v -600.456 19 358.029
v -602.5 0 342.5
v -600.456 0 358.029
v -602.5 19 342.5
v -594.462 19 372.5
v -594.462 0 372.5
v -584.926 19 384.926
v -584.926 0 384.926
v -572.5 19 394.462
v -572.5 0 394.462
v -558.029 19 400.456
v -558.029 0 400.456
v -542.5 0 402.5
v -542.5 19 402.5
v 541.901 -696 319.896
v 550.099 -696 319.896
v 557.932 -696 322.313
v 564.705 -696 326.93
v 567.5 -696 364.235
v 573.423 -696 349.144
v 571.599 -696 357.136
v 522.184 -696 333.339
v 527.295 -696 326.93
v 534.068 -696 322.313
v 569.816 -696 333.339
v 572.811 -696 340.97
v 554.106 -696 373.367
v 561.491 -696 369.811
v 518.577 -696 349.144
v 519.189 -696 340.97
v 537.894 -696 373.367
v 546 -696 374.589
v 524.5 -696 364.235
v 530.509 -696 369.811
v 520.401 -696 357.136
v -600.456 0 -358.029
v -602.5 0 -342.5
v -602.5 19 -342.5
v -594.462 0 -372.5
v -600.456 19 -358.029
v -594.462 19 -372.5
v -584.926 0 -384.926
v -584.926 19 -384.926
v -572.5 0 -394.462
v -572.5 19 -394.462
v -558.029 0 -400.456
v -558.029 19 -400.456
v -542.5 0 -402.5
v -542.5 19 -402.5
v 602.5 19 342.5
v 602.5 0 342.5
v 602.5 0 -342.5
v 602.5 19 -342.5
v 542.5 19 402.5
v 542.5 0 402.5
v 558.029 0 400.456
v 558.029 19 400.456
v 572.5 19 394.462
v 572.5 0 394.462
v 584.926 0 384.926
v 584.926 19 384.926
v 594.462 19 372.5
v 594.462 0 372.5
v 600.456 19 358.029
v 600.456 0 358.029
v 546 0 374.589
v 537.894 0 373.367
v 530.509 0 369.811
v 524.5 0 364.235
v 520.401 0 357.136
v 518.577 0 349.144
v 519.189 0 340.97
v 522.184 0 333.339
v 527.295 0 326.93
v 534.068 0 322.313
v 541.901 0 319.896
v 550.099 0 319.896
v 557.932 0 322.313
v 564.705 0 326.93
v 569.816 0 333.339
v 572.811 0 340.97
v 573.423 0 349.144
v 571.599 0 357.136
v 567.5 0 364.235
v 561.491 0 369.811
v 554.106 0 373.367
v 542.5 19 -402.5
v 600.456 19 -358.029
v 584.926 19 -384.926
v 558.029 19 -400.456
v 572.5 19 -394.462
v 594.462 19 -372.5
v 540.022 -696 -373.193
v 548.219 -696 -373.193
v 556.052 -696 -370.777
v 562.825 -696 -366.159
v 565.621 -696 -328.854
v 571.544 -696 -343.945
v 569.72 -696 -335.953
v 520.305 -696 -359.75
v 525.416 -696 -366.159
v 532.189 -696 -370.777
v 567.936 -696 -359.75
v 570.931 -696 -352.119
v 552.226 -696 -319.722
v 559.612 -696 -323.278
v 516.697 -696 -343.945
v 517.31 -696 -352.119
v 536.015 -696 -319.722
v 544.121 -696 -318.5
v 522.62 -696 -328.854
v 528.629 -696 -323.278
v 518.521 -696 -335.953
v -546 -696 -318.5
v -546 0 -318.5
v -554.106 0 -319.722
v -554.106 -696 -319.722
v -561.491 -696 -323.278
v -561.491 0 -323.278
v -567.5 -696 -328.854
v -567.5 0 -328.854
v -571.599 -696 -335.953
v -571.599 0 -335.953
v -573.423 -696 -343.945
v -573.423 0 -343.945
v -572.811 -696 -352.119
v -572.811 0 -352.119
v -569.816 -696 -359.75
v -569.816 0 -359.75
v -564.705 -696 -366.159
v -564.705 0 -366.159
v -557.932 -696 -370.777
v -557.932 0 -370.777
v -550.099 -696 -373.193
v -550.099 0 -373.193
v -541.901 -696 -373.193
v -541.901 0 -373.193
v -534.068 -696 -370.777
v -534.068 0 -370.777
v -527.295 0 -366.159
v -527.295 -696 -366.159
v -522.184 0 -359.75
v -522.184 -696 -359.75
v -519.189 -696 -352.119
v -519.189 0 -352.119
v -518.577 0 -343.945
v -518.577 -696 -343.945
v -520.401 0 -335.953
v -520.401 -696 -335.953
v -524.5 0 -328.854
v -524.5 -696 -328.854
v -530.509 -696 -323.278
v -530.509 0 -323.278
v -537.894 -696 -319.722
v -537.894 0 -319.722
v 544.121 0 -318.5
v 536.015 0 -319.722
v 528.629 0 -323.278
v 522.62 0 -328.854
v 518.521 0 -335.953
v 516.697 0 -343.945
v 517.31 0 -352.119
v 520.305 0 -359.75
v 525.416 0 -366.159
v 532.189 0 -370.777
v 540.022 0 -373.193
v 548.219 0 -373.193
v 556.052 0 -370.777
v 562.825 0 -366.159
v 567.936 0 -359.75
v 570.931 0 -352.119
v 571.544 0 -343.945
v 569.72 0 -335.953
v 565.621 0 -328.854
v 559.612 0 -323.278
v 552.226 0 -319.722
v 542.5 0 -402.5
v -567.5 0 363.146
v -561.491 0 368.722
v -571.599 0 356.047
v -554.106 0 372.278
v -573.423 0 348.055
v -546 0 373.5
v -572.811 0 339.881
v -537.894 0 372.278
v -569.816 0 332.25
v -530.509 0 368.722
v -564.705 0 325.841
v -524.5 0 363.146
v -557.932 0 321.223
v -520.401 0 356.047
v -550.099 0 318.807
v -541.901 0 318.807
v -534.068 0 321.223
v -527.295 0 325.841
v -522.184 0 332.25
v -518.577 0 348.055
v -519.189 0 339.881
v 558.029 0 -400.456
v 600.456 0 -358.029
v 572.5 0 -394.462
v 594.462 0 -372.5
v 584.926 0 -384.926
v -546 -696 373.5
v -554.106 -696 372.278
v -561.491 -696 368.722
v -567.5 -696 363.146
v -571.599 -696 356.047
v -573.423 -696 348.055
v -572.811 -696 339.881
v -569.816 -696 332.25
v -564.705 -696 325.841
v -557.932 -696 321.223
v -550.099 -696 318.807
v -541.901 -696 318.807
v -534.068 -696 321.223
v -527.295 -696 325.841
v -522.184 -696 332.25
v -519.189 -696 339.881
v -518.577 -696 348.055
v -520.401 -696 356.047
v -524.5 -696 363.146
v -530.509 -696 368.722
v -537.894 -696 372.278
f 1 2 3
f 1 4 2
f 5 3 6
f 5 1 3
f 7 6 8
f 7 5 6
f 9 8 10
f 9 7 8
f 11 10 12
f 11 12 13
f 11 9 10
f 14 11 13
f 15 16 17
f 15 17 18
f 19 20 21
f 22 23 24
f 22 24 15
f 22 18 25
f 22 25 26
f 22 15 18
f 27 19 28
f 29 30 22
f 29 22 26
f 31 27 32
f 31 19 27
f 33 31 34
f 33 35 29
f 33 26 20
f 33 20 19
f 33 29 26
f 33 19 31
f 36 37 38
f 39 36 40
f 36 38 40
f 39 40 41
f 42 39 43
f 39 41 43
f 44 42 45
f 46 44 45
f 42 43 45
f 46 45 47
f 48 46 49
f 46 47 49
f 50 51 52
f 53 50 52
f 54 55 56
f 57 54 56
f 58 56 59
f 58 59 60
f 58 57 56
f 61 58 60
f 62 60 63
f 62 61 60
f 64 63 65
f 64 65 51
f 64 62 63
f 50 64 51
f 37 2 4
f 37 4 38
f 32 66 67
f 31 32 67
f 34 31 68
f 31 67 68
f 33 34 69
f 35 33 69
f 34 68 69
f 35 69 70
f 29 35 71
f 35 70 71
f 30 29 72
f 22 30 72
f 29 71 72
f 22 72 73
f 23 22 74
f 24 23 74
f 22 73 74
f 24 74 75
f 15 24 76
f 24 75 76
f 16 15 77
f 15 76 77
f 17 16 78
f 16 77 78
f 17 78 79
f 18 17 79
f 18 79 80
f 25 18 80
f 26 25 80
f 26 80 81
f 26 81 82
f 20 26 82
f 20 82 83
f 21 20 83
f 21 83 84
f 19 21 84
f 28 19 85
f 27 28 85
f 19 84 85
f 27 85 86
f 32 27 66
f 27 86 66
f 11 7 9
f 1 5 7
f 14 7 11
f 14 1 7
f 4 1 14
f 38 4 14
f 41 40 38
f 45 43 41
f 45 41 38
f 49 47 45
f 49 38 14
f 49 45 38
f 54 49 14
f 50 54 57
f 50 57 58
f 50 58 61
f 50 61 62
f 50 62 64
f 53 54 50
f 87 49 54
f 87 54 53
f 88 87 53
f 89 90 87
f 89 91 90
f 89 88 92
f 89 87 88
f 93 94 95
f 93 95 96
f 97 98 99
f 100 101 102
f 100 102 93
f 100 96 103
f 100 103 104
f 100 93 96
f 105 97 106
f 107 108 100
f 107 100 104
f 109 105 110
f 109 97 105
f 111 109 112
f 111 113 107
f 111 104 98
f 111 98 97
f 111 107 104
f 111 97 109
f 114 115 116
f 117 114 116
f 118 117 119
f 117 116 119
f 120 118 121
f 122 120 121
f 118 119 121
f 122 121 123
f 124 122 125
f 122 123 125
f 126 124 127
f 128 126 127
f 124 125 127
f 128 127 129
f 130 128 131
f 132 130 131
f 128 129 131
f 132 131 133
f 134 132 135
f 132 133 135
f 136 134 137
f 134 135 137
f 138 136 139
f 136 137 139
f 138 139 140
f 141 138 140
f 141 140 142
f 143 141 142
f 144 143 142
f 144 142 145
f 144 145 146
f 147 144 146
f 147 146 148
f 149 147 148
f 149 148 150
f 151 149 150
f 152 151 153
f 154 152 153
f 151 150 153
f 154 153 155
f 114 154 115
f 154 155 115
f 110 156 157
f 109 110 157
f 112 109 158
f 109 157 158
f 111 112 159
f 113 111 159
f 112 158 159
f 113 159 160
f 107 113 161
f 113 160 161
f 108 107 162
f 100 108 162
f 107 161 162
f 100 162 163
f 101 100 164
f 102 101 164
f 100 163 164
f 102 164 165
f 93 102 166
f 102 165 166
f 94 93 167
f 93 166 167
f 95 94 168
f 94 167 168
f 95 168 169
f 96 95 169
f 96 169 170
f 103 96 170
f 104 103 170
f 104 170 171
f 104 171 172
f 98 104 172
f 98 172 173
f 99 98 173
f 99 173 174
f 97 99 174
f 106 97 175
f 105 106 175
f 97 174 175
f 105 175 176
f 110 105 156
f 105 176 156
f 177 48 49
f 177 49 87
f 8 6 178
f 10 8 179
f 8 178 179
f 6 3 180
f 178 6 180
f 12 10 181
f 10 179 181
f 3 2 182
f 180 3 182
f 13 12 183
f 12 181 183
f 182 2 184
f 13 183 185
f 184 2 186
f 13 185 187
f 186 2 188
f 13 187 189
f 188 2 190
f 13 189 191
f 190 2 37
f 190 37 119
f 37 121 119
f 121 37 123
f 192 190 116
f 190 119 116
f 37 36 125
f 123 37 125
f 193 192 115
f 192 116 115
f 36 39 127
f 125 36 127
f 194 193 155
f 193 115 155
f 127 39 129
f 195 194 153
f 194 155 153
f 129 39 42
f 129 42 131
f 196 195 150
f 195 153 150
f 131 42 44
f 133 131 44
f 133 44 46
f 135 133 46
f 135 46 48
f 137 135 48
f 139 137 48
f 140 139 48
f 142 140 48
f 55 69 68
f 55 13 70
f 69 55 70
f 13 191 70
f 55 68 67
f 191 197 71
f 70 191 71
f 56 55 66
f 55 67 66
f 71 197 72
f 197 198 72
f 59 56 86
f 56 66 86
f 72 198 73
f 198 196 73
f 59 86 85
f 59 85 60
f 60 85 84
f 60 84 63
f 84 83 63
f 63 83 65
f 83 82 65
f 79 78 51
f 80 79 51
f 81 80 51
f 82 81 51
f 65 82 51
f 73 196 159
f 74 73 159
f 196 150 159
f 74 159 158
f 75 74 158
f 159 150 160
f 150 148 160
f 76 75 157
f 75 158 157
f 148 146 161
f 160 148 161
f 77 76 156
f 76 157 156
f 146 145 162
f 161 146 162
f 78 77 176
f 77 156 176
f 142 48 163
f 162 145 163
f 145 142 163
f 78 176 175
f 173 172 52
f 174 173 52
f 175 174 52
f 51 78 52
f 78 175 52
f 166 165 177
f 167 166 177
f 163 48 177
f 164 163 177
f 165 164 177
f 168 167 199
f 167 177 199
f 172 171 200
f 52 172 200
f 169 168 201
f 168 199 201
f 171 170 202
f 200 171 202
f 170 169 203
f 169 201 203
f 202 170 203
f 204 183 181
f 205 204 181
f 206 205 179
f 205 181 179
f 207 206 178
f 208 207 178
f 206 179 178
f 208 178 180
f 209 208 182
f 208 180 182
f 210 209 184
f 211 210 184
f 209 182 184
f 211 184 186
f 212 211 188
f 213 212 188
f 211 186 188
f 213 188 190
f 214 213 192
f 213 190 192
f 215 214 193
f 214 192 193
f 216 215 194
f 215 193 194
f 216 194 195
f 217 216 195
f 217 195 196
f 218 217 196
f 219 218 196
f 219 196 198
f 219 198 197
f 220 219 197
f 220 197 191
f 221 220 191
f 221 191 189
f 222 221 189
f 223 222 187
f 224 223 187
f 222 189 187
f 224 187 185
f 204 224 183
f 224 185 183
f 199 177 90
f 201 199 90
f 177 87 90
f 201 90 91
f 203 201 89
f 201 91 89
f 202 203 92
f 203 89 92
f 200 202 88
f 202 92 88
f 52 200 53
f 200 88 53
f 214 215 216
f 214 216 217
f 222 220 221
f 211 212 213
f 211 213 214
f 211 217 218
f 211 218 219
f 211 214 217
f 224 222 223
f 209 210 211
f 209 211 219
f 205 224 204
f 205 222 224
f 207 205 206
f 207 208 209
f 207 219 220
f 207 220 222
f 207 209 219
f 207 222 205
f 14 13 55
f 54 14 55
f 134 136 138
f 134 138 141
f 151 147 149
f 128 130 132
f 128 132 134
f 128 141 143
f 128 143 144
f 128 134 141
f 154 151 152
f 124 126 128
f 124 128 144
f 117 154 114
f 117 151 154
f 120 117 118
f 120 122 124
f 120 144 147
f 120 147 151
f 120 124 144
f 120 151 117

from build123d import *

# Parameters (mm, degrees)
SKETCH1_W           = 1205
SKETCH1_H           = 805
BOSS_EXTRUDE1_DEPTH = 19
SKETCH2_R           = 27.5
BOSS_EXTRUDE2_DEPTH = 696
FILLET1_R           = 60


with BuildPart() as part:
    # Sketch1 → Boss-Extrude1 (new body)
    with BuildSketch(Plane(origin=(0, 0, 0), x_dir=(1, 0, 0), z_dir=(0, 1, 0))):
        Rectangle(SKETCH1_W, SKETCH1_H)
    extrude(amount=BOSS_EXTRUDE1_DEPTH)

    # Sketch2 → Boss-Extrude2 (add)
    with BuildSketch(Plane(origin=(0, 0, 0), x_dir=(-1, 0, 0), z_dir=(0, -1, 0))):
        with Locations(Location((546, 346, 0), (0, 0, 270))):
            Circle(SKETCH2_R)
        with Locations(Location((-544.120521212, 346, 0), (0, 0, 270))):
            Circle(SKETCH2_R)
        with Locations(Location((-546, -347.089225584, 0), (0, 0, 270))):
            Circle(SKETCH2_R)
        with Locations(Location((546, -346, 0), (0, 0, 270))):
            Circle(SKETCH2_R)
    extrude(amount=BOSS_EXTRUDE2_DEPTH)

    # Fillet1
    fillet1_edges = [part.edges().sort_by_distance(p)[0] for p in [
        (-602.5, 9.5, -402.5),
        (-602.5, 9.5, 402.5),
        (602.5, 9.5, 402.5),
        (602.5, 9.5, -402.5),
    ]]
    fillet(fillet1_edges, radius=FILLET1_R)


solid = part.part
